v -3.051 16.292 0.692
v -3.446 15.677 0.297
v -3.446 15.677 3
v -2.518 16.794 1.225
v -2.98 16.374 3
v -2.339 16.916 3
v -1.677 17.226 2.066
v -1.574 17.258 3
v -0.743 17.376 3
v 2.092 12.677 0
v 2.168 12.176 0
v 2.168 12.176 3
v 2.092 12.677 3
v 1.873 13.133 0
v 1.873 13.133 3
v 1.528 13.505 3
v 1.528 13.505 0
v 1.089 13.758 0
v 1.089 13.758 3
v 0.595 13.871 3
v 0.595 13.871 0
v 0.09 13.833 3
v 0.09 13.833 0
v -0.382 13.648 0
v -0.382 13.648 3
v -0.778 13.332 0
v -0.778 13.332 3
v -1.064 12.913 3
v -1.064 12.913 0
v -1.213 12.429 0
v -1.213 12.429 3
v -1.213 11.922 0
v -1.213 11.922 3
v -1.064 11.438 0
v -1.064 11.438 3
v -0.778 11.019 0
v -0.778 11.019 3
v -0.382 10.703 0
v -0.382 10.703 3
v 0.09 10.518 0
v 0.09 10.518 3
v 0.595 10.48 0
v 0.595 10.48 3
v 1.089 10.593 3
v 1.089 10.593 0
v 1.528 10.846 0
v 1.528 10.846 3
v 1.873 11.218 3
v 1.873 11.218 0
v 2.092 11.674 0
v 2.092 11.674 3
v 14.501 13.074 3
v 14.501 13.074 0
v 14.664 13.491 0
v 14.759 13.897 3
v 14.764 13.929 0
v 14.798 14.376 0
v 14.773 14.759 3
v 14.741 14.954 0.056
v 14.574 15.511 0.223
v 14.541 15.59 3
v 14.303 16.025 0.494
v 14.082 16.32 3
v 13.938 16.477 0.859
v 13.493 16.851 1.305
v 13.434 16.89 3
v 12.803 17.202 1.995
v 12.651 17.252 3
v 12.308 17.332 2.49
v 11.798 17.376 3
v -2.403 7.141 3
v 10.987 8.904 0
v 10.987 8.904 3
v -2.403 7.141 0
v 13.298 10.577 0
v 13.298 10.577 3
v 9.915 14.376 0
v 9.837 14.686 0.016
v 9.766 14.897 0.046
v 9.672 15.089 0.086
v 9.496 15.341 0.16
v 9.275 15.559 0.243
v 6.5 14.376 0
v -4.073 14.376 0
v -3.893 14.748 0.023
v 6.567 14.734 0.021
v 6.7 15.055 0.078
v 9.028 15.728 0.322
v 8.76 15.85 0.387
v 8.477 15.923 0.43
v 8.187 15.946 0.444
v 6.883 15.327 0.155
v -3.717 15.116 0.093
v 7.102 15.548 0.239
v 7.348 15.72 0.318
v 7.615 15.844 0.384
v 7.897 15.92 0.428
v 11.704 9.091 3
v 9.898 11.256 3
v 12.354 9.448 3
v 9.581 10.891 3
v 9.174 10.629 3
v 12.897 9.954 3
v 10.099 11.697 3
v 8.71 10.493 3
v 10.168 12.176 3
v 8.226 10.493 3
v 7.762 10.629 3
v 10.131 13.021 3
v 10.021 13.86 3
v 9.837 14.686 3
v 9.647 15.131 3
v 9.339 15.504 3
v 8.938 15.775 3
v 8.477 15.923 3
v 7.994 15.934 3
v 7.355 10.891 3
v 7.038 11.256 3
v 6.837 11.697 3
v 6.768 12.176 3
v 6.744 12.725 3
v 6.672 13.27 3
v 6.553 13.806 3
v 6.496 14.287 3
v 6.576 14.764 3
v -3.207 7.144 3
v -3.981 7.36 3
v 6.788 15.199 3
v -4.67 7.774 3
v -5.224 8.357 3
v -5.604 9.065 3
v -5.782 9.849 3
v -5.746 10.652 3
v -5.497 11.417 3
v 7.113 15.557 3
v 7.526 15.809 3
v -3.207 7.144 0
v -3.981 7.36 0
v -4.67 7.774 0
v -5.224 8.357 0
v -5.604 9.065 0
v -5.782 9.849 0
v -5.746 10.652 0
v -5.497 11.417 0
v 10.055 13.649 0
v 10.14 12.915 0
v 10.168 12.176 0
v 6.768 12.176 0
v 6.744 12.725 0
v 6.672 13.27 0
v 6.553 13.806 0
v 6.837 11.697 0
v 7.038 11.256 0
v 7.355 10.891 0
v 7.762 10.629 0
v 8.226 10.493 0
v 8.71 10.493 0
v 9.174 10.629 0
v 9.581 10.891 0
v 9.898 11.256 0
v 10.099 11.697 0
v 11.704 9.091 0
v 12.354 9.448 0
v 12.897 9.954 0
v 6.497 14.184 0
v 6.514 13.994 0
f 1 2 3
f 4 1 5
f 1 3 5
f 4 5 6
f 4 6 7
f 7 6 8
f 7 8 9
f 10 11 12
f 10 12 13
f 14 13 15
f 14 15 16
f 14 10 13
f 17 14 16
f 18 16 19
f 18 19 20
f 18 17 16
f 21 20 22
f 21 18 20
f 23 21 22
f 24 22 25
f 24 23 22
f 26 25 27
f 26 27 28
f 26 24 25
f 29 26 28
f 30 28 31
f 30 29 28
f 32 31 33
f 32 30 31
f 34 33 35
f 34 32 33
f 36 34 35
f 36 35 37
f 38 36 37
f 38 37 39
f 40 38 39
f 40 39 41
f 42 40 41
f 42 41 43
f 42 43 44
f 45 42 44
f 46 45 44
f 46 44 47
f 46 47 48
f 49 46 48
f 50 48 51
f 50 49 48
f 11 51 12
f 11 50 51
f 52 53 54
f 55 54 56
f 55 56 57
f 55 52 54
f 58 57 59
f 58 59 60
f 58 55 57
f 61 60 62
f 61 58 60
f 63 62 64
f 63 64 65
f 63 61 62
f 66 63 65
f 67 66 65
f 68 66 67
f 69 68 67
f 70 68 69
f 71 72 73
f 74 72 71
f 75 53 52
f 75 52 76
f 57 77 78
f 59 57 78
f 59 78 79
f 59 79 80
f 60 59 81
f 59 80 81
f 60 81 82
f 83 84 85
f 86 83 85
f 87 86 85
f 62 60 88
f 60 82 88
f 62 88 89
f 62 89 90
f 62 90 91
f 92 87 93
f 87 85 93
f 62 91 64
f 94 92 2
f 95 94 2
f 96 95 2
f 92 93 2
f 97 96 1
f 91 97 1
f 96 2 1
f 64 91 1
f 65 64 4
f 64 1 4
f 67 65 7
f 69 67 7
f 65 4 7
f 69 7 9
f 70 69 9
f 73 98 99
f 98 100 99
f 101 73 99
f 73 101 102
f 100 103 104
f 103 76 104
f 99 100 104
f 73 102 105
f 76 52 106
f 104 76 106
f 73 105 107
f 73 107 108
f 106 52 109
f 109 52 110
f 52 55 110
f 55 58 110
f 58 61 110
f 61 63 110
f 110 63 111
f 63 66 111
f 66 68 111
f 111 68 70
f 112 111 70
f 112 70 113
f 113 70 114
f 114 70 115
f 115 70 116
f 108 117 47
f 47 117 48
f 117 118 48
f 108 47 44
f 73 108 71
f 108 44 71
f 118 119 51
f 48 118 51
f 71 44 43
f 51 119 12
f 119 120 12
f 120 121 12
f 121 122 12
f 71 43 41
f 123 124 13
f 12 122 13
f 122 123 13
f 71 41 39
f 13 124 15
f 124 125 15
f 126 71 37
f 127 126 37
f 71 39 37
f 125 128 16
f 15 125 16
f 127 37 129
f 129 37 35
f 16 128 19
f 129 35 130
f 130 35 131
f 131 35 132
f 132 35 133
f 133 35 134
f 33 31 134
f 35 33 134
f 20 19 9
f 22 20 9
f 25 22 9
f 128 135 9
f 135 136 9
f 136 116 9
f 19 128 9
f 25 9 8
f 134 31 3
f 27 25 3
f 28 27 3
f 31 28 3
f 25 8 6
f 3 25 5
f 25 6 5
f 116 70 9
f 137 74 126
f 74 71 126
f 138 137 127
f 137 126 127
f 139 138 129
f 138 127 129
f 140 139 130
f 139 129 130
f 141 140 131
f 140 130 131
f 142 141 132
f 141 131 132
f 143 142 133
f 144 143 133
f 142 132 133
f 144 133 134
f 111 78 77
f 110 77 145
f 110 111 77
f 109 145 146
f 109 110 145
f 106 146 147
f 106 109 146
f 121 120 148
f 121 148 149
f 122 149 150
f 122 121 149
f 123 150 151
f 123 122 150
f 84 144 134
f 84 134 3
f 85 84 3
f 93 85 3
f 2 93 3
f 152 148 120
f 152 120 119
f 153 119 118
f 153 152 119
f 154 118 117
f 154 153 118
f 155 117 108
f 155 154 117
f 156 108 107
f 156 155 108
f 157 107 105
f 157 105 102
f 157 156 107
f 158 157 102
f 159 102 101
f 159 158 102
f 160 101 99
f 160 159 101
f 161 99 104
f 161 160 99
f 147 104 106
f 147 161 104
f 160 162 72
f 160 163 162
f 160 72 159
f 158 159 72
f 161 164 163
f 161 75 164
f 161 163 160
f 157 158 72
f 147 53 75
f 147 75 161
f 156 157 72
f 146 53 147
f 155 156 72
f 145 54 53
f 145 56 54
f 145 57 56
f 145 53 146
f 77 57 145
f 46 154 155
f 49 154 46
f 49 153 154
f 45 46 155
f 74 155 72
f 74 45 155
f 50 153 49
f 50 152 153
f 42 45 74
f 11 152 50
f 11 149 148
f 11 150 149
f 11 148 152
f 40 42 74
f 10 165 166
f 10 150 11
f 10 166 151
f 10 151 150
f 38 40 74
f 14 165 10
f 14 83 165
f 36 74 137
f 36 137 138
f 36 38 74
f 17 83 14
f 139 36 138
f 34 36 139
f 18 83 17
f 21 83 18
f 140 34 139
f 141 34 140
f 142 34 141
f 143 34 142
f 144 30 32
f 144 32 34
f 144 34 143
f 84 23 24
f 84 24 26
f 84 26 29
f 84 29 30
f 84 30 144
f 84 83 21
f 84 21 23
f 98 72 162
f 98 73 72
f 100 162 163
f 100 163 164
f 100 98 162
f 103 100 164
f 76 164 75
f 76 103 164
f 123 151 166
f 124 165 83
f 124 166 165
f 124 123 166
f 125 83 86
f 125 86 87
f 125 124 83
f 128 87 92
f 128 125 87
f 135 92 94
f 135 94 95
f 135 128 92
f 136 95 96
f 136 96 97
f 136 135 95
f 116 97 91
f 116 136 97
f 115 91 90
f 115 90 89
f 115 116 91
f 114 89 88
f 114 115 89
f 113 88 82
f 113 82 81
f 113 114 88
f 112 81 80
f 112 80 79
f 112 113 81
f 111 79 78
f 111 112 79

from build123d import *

# Parameters (mm, degrees)
ESQUISSE1_R             = 1.7
BOSS_EXTRU_1_DEPTH      = 3
ENL_V_MAT_EXTRU_1_DEPTH = 25.197605652
CONG_1_R                = 3
CONG_2_R                = 3


with BuildPart() as part:
    # Esquisse1 → Boss.-Extru.1 (new body)
    with BuildSketch(Plane.XY):
        Polygon((12.594874651, 9.115771584), (-7.904447763, 6.416984589), (-2.628489378, 17.375533229), (16.571510622, 17.375533229), align=None)
        with Locations((8.467987162, 12.175533229)):
            Circle(ESQUISSE1_R, mode=Mode.SUBTRACT)
        with Locations((0.467987162, 12.175533229)):
            Circle(ESQUISSE1_R, mode=Mode.SUBTRACT)
    extrude(amount=BOSS_EXTRU_1_DEPTH)

    # Esquisse2 → Enlèv. mat.-Extru.1 (cut, through all)
    with BuildSketch(Plane.XY.offset(3)):
        with BuildLine():
            ThreePointArc((6.767987162, 12.175533229), (6.714089789, 12.99784824), (6.553319868, 13.806093213))
            ThreePointArc((6.553319868, 13.806093213), (7.755401396, 15.888159494), (9.837467677, 14.686077966))
            ThreePointArc((9.837467677, 14.686077966), (10.085002318, 13.441637293), (10.167987162, 12.175533229))
            ThreePointArc((10.167987162, 12.175533229), (8.467987162, 10.475533229), (6.767987162, 12.175533229))
        make_face()
    extrude(amount=-ENL_V_MAT_EXTRU_1_DEPTH, mode=Mode.SUBTRACT)

    # Congé1
    cong_1_edges = [part.edges().sort_by_distance(p)[0] for p in [
        (-2.628489378, 17.375533229, 1.5),
        (16.571510622, 17.375533229, 1.5),
        (12.594874651, 9.115771584, 1.5),
        (-7.904447763, 6.416984589, 1.5),
    ]]
    fillet(cong_1_edges, radius=CONG_1_R)

    # Congé2
    # the kernel refuses this fillet: 3 mm, written as the material it takes off along each edge
    with BuildSketch(Plane(origin=(-8.243247375, 17.375533229, 0), x_dir=(0, -1, 0), z_dir=(1, 0, 0))) as cong_2_piece_1:
        with BuildLine():
            CenterArc((CONG_2_R, -CONG_2_R), CONG_2_R, 90, 90)
            Line((0, -CONG_2_R), (0, 0))
            Line((0, 0), (CONG_2_R, 0))
        make_face()
    extrude(amount=27.54083508, mode=Mode.SUBTRACT)


solid = part.part
